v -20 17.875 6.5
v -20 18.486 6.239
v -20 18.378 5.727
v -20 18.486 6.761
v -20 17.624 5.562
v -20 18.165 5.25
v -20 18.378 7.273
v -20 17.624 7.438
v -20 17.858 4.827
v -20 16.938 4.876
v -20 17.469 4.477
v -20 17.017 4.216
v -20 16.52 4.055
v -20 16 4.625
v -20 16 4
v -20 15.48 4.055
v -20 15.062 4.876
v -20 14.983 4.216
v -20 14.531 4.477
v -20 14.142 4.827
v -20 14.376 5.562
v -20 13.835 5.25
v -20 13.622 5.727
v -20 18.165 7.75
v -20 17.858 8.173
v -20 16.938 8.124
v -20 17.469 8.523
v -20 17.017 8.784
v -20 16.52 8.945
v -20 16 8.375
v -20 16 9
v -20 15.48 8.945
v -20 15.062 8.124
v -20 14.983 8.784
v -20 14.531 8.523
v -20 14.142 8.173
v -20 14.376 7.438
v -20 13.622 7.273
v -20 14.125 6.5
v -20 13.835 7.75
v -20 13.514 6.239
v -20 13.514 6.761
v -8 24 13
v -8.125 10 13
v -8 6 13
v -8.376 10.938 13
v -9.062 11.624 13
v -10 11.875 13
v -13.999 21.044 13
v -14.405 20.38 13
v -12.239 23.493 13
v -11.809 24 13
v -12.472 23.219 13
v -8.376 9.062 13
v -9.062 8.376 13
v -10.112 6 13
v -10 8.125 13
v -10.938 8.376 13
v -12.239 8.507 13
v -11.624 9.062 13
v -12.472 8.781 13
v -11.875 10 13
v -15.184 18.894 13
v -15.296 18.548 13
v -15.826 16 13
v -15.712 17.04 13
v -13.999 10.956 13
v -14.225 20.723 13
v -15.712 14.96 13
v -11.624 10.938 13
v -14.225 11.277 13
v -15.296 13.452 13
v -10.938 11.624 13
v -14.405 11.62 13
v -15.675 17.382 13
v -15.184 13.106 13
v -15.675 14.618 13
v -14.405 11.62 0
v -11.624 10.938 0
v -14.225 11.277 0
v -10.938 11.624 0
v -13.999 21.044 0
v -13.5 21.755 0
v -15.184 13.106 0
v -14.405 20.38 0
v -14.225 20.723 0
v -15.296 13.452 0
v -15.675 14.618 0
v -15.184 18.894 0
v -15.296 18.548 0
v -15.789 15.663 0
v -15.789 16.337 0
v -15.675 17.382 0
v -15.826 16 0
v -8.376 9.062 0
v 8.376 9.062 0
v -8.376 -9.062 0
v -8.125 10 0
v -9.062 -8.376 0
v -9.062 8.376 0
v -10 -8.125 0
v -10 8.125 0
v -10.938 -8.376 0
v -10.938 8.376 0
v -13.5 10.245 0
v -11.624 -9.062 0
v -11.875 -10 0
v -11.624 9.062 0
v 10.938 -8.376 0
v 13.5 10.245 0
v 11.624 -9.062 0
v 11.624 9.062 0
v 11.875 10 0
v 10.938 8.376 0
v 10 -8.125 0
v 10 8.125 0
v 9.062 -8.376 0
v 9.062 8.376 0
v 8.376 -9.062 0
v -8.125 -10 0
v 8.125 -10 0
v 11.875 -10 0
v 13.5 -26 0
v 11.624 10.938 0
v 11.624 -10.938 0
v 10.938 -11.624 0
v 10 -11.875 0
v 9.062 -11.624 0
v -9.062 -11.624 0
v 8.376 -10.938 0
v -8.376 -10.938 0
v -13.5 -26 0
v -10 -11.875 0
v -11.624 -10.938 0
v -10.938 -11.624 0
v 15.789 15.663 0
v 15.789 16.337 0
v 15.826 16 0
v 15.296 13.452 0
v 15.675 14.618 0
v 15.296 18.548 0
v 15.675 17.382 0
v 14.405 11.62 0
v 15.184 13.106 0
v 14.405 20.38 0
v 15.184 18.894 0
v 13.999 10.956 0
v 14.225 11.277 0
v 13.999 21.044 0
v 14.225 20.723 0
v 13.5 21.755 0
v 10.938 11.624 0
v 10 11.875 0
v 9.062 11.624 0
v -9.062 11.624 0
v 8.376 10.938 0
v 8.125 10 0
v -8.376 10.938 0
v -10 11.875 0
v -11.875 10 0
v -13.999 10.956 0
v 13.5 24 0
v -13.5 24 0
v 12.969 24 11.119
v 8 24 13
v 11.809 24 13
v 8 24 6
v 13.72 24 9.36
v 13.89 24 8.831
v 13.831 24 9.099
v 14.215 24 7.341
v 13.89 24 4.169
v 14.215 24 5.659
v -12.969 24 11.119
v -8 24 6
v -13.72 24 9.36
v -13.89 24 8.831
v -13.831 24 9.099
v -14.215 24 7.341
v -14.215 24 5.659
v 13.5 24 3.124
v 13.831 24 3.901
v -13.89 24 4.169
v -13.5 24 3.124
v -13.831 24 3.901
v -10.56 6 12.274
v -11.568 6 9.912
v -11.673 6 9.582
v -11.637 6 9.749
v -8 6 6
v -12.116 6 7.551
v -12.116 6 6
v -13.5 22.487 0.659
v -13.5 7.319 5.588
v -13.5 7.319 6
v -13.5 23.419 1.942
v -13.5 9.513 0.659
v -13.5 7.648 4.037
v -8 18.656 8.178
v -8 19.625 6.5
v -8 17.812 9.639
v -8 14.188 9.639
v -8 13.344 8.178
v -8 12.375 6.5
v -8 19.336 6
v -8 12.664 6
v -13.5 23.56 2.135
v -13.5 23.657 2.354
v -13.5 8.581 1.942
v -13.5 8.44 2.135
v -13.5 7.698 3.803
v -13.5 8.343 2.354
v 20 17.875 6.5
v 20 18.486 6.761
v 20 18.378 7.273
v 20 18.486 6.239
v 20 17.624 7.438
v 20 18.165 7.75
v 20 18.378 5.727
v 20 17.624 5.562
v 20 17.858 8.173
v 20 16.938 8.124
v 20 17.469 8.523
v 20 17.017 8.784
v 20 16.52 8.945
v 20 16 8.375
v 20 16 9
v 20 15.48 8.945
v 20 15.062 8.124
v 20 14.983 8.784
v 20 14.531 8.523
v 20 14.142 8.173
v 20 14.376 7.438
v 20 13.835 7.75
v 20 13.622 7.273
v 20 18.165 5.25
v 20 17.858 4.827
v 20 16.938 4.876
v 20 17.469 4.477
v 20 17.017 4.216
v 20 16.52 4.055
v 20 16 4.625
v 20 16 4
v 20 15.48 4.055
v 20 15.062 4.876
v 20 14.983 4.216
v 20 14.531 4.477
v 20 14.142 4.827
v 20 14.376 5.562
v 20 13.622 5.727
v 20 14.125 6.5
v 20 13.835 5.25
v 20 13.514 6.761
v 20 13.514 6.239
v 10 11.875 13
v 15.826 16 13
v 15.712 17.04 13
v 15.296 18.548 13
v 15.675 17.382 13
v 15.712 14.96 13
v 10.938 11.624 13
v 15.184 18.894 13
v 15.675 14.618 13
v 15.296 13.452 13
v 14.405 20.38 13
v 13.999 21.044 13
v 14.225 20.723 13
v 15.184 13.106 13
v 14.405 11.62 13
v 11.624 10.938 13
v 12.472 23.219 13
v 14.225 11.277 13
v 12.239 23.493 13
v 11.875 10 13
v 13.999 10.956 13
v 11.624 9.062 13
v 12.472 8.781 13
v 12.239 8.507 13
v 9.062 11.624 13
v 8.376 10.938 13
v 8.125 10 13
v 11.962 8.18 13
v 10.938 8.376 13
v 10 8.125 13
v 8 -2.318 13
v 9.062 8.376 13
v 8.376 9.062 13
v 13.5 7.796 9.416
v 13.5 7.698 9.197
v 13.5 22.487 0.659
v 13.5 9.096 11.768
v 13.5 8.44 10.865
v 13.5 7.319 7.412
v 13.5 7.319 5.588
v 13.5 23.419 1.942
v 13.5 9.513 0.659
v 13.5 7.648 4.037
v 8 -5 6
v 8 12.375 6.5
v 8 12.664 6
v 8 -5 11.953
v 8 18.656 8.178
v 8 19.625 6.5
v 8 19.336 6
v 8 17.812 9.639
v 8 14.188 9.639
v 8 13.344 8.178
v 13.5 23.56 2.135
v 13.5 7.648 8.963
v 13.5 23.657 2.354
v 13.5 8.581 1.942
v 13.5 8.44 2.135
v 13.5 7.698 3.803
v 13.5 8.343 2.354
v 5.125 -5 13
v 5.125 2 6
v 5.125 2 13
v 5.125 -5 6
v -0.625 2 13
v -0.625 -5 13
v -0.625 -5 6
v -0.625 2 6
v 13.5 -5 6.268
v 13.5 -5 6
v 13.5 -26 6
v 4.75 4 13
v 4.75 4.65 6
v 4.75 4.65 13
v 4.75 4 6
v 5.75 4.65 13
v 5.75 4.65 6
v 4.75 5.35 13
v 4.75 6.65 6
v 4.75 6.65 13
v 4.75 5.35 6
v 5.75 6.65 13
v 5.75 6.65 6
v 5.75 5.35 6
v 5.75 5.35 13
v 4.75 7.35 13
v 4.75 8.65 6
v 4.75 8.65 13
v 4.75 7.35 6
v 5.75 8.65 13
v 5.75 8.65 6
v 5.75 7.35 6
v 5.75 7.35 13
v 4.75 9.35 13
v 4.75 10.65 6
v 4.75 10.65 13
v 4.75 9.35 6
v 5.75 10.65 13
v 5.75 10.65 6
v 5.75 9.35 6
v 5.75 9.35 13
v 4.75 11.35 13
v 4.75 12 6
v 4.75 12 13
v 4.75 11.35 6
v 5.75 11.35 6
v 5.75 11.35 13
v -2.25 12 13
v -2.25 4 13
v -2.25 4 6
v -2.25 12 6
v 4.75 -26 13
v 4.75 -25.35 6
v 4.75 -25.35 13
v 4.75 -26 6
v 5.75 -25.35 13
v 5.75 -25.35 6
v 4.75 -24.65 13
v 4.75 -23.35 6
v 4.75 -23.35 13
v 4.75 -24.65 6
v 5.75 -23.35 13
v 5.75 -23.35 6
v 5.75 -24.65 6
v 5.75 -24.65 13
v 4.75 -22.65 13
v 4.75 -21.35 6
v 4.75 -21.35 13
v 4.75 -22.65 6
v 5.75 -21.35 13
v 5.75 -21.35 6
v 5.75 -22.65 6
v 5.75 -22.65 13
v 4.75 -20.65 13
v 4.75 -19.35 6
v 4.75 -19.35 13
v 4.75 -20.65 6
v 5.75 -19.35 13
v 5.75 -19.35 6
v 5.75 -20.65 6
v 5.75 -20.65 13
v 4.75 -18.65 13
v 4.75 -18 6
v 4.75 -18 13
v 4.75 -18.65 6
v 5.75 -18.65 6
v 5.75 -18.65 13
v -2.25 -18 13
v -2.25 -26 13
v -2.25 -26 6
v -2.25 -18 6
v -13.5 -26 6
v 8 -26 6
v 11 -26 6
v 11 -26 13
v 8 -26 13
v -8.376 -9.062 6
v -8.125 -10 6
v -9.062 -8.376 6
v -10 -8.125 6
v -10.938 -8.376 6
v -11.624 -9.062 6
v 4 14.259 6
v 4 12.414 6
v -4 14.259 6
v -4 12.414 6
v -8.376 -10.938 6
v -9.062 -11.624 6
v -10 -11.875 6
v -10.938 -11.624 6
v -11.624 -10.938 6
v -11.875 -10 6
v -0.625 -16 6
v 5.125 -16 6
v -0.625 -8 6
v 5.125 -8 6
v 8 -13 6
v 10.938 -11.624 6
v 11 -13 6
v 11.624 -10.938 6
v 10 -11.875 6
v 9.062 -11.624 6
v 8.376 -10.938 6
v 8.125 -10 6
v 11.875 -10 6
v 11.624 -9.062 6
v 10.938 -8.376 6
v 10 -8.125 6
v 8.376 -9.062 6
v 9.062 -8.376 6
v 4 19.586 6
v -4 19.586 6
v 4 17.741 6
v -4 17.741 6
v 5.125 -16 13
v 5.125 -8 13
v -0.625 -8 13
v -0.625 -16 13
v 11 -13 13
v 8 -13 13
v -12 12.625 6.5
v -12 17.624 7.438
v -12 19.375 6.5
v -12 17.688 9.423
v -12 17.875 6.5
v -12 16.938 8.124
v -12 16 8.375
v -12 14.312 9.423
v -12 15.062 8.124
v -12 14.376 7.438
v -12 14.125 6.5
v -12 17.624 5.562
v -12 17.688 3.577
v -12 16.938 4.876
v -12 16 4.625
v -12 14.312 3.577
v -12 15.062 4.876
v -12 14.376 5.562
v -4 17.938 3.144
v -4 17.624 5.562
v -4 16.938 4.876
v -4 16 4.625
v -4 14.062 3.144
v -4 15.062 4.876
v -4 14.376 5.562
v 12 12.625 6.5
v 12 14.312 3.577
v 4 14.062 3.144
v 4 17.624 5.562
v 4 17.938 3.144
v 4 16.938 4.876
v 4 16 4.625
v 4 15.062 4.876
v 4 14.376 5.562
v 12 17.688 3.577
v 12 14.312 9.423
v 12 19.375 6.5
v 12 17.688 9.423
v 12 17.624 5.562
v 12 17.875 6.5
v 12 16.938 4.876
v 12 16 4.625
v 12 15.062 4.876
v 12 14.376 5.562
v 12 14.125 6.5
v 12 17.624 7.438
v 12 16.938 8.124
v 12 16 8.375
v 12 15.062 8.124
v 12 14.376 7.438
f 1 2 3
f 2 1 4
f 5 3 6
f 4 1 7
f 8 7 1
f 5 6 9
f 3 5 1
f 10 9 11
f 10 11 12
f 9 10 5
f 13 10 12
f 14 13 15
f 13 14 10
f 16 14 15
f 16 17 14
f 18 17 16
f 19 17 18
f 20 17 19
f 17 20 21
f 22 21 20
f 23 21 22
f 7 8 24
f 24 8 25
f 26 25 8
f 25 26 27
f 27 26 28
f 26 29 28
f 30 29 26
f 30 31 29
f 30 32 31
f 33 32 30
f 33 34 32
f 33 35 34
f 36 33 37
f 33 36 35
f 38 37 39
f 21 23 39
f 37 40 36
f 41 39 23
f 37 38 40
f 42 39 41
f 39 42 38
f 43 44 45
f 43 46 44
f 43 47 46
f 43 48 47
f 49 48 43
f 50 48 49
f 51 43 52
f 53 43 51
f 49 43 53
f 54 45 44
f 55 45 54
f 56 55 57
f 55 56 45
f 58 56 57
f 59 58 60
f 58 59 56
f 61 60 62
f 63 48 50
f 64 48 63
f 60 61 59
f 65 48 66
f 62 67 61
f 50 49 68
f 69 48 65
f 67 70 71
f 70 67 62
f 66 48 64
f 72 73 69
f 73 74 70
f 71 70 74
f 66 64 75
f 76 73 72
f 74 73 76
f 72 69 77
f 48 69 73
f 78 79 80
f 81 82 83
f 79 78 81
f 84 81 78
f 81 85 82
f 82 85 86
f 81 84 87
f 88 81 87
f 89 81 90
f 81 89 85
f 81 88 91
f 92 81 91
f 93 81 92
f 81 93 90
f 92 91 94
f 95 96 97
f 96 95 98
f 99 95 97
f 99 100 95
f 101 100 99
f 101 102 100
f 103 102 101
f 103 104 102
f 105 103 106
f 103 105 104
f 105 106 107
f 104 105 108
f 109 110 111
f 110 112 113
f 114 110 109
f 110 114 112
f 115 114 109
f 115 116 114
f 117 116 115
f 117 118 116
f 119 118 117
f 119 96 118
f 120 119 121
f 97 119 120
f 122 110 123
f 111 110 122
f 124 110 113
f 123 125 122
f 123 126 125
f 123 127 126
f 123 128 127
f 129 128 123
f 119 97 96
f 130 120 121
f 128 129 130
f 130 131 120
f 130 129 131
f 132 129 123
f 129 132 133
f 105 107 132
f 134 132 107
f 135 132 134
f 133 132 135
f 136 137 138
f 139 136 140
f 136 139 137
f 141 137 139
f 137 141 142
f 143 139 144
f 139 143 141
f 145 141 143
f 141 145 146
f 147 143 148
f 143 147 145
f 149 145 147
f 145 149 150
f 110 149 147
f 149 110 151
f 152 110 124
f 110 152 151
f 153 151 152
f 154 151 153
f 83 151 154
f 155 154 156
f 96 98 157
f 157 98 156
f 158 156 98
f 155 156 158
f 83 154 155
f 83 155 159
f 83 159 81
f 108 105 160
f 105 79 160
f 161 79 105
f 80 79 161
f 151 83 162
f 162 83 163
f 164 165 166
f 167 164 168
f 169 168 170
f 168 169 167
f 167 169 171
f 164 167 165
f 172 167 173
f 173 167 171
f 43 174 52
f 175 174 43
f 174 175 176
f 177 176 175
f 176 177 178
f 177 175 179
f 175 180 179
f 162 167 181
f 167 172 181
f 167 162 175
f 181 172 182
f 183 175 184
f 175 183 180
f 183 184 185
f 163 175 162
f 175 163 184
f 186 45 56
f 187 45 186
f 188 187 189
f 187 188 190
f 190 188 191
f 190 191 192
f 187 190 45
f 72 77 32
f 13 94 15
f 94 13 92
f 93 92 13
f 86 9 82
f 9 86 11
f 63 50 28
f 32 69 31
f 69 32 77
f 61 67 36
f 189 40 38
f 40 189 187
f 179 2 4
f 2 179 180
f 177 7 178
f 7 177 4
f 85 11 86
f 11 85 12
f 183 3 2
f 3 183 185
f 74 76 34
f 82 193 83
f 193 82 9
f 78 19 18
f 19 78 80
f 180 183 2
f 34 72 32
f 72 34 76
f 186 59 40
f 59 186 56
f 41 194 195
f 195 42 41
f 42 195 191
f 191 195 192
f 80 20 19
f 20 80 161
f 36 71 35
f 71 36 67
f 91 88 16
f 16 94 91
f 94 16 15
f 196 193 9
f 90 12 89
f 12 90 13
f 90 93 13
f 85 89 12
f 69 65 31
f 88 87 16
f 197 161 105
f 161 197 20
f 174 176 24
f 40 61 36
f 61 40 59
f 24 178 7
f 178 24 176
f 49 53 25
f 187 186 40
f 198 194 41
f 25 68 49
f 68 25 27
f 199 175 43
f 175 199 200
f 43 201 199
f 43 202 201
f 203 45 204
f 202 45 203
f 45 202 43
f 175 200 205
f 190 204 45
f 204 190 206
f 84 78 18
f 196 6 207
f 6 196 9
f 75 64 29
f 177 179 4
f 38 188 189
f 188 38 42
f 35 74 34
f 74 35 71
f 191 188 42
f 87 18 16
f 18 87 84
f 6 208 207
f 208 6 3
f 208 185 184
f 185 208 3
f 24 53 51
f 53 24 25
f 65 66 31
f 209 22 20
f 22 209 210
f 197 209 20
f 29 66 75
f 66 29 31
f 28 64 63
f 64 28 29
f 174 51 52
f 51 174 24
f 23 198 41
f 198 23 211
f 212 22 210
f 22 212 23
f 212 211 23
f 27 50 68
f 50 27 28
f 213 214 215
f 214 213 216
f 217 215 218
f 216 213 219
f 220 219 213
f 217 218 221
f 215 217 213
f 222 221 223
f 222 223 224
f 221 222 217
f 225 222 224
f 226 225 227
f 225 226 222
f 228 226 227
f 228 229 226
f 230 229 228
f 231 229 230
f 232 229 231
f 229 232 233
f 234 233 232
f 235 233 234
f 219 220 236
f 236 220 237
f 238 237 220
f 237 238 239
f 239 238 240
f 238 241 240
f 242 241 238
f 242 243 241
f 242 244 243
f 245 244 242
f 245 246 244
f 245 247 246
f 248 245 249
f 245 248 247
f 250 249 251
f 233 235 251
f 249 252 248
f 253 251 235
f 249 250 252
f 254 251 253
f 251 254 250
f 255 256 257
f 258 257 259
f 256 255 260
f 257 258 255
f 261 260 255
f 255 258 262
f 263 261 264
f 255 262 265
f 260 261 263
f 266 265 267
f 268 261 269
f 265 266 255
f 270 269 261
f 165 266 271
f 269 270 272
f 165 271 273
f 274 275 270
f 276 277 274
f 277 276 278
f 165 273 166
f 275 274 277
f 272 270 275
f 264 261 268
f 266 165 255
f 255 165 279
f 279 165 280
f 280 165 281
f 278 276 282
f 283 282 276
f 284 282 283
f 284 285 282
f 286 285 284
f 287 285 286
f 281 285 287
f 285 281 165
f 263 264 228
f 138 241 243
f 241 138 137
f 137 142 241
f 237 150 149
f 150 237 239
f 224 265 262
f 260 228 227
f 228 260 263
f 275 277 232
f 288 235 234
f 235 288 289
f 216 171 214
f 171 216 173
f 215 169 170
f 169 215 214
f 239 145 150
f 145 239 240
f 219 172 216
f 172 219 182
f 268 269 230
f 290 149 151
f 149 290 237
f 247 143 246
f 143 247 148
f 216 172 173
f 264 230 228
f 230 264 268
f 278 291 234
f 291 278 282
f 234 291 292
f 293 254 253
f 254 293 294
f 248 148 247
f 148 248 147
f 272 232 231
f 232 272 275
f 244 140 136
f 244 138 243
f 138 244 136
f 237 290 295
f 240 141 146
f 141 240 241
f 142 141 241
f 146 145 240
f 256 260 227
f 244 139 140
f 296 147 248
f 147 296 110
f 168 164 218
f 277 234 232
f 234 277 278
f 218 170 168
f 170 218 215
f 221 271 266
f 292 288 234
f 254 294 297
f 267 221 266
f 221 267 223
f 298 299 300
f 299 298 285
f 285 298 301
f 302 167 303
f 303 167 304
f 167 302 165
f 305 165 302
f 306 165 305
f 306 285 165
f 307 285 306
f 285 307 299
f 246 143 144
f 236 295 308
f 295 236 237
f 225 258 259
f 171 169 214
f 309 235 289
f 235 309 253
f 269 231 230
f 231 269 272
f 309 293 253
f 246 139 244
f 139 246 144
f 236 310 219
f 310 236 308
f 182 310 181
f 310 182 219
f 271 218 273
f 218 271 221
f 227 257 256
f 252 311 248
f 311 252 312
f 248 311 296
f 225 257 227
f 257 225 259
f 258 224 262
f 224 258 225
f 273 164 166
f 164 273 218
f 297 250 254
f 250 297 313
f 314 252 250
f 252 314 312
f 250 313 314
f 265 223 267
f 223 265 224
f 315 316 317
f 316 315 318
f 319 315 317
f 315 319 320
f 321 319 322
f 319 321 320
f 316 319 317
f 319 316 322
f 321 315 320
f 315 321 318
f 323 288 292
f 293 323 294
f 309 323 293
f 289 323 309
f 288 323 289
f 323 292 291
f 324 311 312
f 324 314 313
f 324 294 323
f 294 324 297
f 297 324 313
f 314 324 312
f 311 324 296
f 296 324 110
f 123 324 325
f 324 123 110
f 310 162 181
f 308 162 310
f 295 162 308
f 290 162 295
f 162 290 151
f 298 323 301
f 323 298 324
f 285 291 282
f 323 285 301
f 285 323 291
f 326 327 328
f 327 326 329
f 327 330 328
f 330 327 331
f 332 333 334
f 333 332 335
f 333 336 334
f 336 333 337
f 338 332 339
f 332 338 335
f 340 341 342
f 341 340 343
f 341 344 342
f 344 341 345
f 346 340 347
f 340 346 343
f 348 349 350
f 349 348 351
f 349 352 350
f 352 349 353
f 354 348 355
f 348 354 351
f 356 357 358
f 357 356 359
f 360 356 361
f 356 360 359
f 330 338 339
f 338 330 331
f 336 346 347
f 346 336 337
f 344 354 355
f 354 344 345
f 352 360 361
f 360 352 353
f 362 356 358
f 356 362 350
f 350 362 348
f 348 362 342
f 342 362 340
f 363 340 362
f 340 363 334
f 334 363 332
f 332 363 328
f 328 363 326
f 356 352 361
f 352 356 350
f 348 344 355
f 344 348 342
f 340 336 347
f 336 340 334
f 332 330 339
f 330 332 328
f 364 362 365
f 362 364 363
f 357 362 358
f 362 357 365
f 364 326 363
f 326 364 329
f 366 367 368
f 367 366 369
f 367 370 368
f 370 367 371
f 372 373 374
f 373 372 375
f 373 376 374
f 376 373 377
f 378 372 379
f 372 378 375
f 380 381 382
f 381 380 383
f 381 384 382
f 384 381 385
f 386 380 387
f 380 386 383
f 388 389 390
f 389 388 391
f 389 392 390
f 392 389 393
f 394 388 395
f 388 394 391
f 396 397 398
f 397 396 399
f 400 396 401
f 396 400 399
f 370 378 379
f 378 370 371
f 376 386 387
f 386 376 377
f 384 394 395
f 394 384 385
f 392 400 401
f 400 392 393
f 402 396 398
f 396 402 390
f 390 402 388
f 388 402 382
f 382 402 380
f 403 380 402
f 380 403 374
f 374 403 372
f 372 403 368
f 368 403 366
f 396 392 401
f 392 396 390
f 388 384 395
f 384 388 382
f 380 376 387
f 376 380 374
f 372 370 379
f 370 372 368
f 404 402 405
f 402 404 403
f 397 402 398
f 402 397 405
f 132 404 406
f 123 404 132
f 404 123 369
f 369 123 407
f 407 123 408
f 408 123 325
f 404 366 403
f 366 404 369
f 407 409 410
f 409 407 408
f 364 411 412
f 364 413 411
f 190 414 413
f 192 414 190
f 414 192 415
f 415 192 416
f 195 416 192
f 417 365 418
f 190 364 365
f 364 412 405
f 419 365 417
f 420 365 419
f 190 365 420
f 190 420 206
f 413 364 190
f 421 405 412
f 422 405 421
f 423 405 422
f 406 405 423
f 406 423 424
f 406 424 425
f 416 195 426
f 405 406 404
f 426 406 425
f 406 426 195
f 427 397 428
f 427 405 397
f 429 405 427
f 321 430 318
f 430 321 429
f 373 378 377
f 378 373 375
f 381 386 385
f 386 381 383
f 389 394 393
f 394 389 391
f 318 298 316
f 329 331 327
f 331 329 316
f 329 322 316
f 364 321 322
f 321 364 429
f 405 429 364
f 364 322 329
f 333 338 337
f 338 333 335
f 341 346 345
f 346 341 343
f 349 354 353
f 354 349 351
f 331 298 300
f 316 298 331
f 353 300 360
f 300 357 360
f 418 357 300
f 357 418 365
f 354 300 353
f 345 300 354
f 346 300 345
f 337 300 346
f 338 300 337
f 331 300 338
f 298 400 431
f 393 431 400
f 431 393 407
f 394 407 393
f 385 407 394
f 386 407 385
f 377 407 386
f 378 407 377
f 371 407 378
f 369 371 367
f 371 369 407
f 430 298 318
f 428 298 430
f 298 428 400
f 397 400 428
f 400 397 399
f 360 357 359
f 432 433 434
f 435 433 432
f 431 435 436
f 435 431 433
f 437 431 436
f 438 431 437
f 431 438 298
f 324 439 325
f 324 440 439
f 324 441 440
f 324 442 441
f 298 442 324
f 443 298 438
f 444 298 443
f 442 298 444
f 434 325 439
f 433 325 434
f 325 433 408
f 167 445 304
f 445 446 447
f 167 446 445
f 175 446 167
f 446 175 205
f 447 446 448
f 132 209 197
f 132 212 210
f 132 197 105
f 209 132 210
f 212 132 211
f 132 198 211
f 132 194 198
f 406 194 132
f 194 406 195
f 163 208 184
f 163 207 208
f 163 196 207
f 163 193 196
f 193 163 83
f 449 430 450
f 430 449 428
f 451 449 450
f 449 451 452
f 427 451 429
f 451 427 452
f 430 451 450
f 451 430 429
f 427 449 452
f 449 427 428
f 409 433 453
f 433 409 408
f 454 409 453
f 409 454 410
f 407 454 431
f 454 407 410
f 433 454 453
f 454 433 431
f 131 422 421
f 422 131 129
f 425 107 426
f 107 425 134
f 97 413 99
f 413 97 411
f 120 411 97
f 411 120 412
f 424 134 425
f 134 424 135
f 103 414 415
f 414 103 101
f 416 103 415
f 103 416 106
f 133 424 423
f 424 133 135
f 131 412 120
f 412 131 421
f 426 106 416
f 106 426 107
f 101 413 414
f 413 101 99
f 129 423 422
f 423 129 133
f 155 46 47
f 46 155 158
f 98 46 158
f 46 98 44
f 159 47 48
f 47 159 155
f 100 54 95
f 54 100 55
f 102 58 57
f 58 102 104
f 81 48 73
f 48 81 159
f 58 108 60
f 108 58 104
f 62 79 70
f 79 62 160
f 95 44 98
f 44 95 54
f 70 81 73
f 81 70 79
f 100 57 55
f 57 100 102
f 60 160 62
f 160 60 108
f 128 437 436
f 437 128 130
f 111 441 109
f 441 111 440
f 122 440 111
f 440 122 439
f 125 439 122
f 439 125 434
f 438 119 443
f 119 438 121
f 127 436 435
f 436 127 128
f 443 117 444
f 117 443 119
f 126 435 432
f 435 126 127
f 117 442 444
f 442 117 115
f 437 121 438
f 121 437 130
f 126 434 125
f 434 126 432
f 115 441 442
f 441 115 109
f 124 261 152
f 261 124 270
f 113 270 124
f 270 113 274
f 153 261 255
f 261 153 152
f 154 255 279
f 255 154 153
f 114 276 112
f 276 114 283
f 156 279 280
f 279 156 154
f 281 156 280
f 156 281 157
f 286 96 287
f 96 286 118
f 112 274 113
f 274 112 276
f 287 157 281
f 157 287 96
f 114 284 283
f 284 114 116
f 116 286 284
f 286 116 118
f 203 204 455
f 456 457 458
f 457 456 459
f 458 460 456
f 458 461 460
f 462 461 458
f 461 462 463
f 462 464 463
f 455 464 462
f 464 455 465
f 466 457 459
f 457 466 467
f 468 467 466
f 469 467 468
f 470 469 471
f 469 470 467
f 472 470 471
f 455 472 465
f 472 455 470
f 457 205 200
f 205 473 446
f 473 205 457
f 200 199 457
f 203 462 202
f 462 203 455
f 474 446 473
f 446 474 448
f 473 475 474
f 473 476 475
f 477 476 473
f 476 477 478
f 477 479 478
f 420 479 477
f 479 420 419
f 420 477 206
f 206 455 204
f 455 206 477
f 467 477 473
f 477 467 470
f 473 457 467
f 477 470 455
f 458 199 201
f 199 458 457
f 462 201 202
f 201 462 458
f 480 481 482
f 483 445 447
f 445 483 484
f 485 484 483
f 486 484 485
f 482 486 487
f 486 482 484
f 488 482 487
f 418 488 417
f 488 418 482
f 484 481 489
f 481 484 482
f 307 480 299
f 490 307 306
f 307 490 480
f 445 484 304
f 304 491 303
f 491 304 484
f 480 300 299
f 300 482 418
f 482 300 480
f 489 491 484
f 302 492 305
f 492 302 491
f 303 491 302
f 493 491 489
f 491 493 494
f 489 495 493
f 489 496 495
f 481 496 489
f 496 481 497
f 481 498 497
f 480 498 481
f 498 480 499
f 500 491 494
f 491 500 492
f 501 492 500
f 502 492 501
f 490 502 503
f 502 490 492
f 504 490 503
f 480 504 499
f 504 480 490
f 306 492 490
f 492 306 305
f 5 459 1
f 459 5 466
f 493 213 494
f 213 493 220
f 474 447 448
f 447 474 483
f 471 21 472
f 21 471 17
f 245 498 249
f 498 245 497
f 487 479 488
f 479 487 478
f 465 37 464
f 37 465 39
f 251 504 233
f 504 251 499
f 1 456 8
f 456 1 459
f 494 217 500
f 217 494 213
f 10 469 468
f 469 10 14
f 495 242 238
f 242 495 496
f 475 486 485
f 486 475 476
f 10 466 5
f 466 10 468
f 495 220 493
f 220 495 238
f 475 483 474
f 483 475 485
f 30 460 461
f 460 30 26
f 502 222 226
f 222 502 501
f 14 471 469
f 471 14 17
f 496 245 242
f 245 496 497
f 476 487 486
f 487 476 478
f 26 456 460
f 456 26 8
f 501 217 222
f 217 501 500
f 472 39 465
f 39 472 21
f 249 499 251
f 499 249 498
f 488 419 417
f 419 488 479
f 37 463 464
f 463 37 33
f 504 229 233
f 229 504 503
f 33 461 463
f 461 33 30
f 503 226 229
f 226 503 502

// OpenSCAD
// file: ../include/configuration.scad
// Increase this if your slicer or printer make holes too tight.
extra_radius = 0.125;

// OD = outside diameter, corner to corner.
m3_nut_od = 6.1;
m3_nut_radius = m3_nut_od/2 + 0.2 + extra_radius;
m3_washer_radius = 3.5 + extra_radius;

// Major diameter of metric 3mm thread.
m3_major = 2.85;
m3_radius = m3_major/2 + extra_radius;
m3_wide_radius = m3_major/2 + extra_radius + 0.2;

// Major diameter of metric 5mm thread.
m5_major = 4.85;
m5_radius = m5_major/2 + extra_radius;
m5_wide_radius = m5_major/2 + extra_radius + 0.2;

// NEMA17 stepper motors.
motor_shaft_diameter = 5;
motor_shaft_radius = motor_shaft_diameter/2 + extra_radius;

// Frame brackets. M3x8mm screws work best with 3.6 mm brackets.
thickness = 3.6;

// OpenBeam or Misumi. Currently only 15x15 mm, but there is a plan
// to make models more parametric and allow 20x20 mm in the future.
extrusion = 15;

// Placement for the NEMA17 stepper motors.
motor_offset = 44;
motor_length = 47;

// Horizontal extrusion size
frame_base_size = 420;
// main file
include <../include/configuration.scad>;

separation = 40;
thickness = 6;

horn_thickness = 13;
horn_x = 8;

belt_width = 5;
belt_x = 6.75;
belt_z = 7;

tooth_width=1.3;
tooth_height=.75;
belt_pitch = 2;

stol=0.125;

module teeth(width) {
	for ( i = [round(-width/belt_pitch/2) : round(width/belt_pitch/2)]){
			translate(v = [0,belt_pitch*i,tooth_height])cube(size = [horn_thickness-2, tooth_width, tooth_height*2], center = true);
		}
}



module carriage() {
  // Timing belt (up and down).
  translate([-belt_x, 0, belt_z + belt_width/2]) %
    cube([1.7, 100, belt_width], center=true);
  translate([belt_x, 0, belt_z + belt_width/2]) %
    cube([1.7, 100, belt_width], center=true);
  difference() {
    union() {
      // Main body.
      translate([0, -1, thickness/2])
        cube([27, 50, thickness], center=true);
      // Ball joint mount horns.
      for (x = [-1, 1]) {
        scale([x, 1, 1]) intersection() {
          translate([0, 15, horn_thickness/2])
            cube([separation, 18, horn_thickness], center=true);
          translate([horn_x, 16, horn_thickness/2]) rotate([0, 90, 0])
            cylinder(r1=14, r2=2.5, h=separation/2-horn_x);
        }
      }
      // Belt clamps.
      difference() {
        union() {
          translate([2.25, -1.5, horn_thickness/2+1])
            cube([5.75, 7, horn_thickness-2], center=true);
          translate([10.75, 2.5, horn_thickness/2+1])
            cube([5.5, 15, horn_thickness-2], center=true);
        }
        // Avoid touching diagonal push rods (carbon tube).
        translate([20, -10, 12.5]) rotate([35, 35, 30])
          cube([40, 40, 20], center=true);
      }
		
		translate([2.25, -12, horn_thickness/2+1]) cube([5.75, 8, horn_thickness-2], center=true);
		
		difference() {
			translate([1.75, 8, horn_thickness/2+1]) cube([8, 8, horn_thickness-2], center=true);
			translate([4+tooth_height, 8, horn_thickness/2+2]) rotate([0,90,0]) teeth(8);
		}

		difference() {
			translate([1.75, -22, horn_thickness/2+1]) cube([8, 8, horn_thickness-2], center=true);
			translate([4+tooth_height, -22, horn_thickness/2+2]) rotate([0,90,0]) teeth(8);
		}

		translate([9.5, -19.5, horn_thickness/2+1]) cube([3, 13, horn_thickness-2], center=true);
    }
    // Screws for linear slider.
    for (x = [-10, 10]) {
      for (y = [-10, 10]) {
        translate([x, y, thickness]) #
          cylinder(r=m3_wide_radius+stol, h=30, center=true, $fn=12);
      }
    }
    // Screws for ball joints.
    translate([0, 16, horn_thickness/2]) rotate([0, 90, 0]) #
      cylinder(r=m3_wide_radius+stol, h=60, center=true, $fn=12);
    // Lock nuts for ball joints.
    for (x = [-1, 1]) {
      scale([x, 1, 1]) intersection() {
        translate([horn_x, 16, horn_thickness/2]) rotate([90, 0, -90])
          cylinder(r1=m3_nut_radius, r2=m3_nut_radius+0.5, h=8,
                   center=true, $fn=6);
      }
    }
  }
}

carriage();
//rotate([90,90,0]) teeth(5);
